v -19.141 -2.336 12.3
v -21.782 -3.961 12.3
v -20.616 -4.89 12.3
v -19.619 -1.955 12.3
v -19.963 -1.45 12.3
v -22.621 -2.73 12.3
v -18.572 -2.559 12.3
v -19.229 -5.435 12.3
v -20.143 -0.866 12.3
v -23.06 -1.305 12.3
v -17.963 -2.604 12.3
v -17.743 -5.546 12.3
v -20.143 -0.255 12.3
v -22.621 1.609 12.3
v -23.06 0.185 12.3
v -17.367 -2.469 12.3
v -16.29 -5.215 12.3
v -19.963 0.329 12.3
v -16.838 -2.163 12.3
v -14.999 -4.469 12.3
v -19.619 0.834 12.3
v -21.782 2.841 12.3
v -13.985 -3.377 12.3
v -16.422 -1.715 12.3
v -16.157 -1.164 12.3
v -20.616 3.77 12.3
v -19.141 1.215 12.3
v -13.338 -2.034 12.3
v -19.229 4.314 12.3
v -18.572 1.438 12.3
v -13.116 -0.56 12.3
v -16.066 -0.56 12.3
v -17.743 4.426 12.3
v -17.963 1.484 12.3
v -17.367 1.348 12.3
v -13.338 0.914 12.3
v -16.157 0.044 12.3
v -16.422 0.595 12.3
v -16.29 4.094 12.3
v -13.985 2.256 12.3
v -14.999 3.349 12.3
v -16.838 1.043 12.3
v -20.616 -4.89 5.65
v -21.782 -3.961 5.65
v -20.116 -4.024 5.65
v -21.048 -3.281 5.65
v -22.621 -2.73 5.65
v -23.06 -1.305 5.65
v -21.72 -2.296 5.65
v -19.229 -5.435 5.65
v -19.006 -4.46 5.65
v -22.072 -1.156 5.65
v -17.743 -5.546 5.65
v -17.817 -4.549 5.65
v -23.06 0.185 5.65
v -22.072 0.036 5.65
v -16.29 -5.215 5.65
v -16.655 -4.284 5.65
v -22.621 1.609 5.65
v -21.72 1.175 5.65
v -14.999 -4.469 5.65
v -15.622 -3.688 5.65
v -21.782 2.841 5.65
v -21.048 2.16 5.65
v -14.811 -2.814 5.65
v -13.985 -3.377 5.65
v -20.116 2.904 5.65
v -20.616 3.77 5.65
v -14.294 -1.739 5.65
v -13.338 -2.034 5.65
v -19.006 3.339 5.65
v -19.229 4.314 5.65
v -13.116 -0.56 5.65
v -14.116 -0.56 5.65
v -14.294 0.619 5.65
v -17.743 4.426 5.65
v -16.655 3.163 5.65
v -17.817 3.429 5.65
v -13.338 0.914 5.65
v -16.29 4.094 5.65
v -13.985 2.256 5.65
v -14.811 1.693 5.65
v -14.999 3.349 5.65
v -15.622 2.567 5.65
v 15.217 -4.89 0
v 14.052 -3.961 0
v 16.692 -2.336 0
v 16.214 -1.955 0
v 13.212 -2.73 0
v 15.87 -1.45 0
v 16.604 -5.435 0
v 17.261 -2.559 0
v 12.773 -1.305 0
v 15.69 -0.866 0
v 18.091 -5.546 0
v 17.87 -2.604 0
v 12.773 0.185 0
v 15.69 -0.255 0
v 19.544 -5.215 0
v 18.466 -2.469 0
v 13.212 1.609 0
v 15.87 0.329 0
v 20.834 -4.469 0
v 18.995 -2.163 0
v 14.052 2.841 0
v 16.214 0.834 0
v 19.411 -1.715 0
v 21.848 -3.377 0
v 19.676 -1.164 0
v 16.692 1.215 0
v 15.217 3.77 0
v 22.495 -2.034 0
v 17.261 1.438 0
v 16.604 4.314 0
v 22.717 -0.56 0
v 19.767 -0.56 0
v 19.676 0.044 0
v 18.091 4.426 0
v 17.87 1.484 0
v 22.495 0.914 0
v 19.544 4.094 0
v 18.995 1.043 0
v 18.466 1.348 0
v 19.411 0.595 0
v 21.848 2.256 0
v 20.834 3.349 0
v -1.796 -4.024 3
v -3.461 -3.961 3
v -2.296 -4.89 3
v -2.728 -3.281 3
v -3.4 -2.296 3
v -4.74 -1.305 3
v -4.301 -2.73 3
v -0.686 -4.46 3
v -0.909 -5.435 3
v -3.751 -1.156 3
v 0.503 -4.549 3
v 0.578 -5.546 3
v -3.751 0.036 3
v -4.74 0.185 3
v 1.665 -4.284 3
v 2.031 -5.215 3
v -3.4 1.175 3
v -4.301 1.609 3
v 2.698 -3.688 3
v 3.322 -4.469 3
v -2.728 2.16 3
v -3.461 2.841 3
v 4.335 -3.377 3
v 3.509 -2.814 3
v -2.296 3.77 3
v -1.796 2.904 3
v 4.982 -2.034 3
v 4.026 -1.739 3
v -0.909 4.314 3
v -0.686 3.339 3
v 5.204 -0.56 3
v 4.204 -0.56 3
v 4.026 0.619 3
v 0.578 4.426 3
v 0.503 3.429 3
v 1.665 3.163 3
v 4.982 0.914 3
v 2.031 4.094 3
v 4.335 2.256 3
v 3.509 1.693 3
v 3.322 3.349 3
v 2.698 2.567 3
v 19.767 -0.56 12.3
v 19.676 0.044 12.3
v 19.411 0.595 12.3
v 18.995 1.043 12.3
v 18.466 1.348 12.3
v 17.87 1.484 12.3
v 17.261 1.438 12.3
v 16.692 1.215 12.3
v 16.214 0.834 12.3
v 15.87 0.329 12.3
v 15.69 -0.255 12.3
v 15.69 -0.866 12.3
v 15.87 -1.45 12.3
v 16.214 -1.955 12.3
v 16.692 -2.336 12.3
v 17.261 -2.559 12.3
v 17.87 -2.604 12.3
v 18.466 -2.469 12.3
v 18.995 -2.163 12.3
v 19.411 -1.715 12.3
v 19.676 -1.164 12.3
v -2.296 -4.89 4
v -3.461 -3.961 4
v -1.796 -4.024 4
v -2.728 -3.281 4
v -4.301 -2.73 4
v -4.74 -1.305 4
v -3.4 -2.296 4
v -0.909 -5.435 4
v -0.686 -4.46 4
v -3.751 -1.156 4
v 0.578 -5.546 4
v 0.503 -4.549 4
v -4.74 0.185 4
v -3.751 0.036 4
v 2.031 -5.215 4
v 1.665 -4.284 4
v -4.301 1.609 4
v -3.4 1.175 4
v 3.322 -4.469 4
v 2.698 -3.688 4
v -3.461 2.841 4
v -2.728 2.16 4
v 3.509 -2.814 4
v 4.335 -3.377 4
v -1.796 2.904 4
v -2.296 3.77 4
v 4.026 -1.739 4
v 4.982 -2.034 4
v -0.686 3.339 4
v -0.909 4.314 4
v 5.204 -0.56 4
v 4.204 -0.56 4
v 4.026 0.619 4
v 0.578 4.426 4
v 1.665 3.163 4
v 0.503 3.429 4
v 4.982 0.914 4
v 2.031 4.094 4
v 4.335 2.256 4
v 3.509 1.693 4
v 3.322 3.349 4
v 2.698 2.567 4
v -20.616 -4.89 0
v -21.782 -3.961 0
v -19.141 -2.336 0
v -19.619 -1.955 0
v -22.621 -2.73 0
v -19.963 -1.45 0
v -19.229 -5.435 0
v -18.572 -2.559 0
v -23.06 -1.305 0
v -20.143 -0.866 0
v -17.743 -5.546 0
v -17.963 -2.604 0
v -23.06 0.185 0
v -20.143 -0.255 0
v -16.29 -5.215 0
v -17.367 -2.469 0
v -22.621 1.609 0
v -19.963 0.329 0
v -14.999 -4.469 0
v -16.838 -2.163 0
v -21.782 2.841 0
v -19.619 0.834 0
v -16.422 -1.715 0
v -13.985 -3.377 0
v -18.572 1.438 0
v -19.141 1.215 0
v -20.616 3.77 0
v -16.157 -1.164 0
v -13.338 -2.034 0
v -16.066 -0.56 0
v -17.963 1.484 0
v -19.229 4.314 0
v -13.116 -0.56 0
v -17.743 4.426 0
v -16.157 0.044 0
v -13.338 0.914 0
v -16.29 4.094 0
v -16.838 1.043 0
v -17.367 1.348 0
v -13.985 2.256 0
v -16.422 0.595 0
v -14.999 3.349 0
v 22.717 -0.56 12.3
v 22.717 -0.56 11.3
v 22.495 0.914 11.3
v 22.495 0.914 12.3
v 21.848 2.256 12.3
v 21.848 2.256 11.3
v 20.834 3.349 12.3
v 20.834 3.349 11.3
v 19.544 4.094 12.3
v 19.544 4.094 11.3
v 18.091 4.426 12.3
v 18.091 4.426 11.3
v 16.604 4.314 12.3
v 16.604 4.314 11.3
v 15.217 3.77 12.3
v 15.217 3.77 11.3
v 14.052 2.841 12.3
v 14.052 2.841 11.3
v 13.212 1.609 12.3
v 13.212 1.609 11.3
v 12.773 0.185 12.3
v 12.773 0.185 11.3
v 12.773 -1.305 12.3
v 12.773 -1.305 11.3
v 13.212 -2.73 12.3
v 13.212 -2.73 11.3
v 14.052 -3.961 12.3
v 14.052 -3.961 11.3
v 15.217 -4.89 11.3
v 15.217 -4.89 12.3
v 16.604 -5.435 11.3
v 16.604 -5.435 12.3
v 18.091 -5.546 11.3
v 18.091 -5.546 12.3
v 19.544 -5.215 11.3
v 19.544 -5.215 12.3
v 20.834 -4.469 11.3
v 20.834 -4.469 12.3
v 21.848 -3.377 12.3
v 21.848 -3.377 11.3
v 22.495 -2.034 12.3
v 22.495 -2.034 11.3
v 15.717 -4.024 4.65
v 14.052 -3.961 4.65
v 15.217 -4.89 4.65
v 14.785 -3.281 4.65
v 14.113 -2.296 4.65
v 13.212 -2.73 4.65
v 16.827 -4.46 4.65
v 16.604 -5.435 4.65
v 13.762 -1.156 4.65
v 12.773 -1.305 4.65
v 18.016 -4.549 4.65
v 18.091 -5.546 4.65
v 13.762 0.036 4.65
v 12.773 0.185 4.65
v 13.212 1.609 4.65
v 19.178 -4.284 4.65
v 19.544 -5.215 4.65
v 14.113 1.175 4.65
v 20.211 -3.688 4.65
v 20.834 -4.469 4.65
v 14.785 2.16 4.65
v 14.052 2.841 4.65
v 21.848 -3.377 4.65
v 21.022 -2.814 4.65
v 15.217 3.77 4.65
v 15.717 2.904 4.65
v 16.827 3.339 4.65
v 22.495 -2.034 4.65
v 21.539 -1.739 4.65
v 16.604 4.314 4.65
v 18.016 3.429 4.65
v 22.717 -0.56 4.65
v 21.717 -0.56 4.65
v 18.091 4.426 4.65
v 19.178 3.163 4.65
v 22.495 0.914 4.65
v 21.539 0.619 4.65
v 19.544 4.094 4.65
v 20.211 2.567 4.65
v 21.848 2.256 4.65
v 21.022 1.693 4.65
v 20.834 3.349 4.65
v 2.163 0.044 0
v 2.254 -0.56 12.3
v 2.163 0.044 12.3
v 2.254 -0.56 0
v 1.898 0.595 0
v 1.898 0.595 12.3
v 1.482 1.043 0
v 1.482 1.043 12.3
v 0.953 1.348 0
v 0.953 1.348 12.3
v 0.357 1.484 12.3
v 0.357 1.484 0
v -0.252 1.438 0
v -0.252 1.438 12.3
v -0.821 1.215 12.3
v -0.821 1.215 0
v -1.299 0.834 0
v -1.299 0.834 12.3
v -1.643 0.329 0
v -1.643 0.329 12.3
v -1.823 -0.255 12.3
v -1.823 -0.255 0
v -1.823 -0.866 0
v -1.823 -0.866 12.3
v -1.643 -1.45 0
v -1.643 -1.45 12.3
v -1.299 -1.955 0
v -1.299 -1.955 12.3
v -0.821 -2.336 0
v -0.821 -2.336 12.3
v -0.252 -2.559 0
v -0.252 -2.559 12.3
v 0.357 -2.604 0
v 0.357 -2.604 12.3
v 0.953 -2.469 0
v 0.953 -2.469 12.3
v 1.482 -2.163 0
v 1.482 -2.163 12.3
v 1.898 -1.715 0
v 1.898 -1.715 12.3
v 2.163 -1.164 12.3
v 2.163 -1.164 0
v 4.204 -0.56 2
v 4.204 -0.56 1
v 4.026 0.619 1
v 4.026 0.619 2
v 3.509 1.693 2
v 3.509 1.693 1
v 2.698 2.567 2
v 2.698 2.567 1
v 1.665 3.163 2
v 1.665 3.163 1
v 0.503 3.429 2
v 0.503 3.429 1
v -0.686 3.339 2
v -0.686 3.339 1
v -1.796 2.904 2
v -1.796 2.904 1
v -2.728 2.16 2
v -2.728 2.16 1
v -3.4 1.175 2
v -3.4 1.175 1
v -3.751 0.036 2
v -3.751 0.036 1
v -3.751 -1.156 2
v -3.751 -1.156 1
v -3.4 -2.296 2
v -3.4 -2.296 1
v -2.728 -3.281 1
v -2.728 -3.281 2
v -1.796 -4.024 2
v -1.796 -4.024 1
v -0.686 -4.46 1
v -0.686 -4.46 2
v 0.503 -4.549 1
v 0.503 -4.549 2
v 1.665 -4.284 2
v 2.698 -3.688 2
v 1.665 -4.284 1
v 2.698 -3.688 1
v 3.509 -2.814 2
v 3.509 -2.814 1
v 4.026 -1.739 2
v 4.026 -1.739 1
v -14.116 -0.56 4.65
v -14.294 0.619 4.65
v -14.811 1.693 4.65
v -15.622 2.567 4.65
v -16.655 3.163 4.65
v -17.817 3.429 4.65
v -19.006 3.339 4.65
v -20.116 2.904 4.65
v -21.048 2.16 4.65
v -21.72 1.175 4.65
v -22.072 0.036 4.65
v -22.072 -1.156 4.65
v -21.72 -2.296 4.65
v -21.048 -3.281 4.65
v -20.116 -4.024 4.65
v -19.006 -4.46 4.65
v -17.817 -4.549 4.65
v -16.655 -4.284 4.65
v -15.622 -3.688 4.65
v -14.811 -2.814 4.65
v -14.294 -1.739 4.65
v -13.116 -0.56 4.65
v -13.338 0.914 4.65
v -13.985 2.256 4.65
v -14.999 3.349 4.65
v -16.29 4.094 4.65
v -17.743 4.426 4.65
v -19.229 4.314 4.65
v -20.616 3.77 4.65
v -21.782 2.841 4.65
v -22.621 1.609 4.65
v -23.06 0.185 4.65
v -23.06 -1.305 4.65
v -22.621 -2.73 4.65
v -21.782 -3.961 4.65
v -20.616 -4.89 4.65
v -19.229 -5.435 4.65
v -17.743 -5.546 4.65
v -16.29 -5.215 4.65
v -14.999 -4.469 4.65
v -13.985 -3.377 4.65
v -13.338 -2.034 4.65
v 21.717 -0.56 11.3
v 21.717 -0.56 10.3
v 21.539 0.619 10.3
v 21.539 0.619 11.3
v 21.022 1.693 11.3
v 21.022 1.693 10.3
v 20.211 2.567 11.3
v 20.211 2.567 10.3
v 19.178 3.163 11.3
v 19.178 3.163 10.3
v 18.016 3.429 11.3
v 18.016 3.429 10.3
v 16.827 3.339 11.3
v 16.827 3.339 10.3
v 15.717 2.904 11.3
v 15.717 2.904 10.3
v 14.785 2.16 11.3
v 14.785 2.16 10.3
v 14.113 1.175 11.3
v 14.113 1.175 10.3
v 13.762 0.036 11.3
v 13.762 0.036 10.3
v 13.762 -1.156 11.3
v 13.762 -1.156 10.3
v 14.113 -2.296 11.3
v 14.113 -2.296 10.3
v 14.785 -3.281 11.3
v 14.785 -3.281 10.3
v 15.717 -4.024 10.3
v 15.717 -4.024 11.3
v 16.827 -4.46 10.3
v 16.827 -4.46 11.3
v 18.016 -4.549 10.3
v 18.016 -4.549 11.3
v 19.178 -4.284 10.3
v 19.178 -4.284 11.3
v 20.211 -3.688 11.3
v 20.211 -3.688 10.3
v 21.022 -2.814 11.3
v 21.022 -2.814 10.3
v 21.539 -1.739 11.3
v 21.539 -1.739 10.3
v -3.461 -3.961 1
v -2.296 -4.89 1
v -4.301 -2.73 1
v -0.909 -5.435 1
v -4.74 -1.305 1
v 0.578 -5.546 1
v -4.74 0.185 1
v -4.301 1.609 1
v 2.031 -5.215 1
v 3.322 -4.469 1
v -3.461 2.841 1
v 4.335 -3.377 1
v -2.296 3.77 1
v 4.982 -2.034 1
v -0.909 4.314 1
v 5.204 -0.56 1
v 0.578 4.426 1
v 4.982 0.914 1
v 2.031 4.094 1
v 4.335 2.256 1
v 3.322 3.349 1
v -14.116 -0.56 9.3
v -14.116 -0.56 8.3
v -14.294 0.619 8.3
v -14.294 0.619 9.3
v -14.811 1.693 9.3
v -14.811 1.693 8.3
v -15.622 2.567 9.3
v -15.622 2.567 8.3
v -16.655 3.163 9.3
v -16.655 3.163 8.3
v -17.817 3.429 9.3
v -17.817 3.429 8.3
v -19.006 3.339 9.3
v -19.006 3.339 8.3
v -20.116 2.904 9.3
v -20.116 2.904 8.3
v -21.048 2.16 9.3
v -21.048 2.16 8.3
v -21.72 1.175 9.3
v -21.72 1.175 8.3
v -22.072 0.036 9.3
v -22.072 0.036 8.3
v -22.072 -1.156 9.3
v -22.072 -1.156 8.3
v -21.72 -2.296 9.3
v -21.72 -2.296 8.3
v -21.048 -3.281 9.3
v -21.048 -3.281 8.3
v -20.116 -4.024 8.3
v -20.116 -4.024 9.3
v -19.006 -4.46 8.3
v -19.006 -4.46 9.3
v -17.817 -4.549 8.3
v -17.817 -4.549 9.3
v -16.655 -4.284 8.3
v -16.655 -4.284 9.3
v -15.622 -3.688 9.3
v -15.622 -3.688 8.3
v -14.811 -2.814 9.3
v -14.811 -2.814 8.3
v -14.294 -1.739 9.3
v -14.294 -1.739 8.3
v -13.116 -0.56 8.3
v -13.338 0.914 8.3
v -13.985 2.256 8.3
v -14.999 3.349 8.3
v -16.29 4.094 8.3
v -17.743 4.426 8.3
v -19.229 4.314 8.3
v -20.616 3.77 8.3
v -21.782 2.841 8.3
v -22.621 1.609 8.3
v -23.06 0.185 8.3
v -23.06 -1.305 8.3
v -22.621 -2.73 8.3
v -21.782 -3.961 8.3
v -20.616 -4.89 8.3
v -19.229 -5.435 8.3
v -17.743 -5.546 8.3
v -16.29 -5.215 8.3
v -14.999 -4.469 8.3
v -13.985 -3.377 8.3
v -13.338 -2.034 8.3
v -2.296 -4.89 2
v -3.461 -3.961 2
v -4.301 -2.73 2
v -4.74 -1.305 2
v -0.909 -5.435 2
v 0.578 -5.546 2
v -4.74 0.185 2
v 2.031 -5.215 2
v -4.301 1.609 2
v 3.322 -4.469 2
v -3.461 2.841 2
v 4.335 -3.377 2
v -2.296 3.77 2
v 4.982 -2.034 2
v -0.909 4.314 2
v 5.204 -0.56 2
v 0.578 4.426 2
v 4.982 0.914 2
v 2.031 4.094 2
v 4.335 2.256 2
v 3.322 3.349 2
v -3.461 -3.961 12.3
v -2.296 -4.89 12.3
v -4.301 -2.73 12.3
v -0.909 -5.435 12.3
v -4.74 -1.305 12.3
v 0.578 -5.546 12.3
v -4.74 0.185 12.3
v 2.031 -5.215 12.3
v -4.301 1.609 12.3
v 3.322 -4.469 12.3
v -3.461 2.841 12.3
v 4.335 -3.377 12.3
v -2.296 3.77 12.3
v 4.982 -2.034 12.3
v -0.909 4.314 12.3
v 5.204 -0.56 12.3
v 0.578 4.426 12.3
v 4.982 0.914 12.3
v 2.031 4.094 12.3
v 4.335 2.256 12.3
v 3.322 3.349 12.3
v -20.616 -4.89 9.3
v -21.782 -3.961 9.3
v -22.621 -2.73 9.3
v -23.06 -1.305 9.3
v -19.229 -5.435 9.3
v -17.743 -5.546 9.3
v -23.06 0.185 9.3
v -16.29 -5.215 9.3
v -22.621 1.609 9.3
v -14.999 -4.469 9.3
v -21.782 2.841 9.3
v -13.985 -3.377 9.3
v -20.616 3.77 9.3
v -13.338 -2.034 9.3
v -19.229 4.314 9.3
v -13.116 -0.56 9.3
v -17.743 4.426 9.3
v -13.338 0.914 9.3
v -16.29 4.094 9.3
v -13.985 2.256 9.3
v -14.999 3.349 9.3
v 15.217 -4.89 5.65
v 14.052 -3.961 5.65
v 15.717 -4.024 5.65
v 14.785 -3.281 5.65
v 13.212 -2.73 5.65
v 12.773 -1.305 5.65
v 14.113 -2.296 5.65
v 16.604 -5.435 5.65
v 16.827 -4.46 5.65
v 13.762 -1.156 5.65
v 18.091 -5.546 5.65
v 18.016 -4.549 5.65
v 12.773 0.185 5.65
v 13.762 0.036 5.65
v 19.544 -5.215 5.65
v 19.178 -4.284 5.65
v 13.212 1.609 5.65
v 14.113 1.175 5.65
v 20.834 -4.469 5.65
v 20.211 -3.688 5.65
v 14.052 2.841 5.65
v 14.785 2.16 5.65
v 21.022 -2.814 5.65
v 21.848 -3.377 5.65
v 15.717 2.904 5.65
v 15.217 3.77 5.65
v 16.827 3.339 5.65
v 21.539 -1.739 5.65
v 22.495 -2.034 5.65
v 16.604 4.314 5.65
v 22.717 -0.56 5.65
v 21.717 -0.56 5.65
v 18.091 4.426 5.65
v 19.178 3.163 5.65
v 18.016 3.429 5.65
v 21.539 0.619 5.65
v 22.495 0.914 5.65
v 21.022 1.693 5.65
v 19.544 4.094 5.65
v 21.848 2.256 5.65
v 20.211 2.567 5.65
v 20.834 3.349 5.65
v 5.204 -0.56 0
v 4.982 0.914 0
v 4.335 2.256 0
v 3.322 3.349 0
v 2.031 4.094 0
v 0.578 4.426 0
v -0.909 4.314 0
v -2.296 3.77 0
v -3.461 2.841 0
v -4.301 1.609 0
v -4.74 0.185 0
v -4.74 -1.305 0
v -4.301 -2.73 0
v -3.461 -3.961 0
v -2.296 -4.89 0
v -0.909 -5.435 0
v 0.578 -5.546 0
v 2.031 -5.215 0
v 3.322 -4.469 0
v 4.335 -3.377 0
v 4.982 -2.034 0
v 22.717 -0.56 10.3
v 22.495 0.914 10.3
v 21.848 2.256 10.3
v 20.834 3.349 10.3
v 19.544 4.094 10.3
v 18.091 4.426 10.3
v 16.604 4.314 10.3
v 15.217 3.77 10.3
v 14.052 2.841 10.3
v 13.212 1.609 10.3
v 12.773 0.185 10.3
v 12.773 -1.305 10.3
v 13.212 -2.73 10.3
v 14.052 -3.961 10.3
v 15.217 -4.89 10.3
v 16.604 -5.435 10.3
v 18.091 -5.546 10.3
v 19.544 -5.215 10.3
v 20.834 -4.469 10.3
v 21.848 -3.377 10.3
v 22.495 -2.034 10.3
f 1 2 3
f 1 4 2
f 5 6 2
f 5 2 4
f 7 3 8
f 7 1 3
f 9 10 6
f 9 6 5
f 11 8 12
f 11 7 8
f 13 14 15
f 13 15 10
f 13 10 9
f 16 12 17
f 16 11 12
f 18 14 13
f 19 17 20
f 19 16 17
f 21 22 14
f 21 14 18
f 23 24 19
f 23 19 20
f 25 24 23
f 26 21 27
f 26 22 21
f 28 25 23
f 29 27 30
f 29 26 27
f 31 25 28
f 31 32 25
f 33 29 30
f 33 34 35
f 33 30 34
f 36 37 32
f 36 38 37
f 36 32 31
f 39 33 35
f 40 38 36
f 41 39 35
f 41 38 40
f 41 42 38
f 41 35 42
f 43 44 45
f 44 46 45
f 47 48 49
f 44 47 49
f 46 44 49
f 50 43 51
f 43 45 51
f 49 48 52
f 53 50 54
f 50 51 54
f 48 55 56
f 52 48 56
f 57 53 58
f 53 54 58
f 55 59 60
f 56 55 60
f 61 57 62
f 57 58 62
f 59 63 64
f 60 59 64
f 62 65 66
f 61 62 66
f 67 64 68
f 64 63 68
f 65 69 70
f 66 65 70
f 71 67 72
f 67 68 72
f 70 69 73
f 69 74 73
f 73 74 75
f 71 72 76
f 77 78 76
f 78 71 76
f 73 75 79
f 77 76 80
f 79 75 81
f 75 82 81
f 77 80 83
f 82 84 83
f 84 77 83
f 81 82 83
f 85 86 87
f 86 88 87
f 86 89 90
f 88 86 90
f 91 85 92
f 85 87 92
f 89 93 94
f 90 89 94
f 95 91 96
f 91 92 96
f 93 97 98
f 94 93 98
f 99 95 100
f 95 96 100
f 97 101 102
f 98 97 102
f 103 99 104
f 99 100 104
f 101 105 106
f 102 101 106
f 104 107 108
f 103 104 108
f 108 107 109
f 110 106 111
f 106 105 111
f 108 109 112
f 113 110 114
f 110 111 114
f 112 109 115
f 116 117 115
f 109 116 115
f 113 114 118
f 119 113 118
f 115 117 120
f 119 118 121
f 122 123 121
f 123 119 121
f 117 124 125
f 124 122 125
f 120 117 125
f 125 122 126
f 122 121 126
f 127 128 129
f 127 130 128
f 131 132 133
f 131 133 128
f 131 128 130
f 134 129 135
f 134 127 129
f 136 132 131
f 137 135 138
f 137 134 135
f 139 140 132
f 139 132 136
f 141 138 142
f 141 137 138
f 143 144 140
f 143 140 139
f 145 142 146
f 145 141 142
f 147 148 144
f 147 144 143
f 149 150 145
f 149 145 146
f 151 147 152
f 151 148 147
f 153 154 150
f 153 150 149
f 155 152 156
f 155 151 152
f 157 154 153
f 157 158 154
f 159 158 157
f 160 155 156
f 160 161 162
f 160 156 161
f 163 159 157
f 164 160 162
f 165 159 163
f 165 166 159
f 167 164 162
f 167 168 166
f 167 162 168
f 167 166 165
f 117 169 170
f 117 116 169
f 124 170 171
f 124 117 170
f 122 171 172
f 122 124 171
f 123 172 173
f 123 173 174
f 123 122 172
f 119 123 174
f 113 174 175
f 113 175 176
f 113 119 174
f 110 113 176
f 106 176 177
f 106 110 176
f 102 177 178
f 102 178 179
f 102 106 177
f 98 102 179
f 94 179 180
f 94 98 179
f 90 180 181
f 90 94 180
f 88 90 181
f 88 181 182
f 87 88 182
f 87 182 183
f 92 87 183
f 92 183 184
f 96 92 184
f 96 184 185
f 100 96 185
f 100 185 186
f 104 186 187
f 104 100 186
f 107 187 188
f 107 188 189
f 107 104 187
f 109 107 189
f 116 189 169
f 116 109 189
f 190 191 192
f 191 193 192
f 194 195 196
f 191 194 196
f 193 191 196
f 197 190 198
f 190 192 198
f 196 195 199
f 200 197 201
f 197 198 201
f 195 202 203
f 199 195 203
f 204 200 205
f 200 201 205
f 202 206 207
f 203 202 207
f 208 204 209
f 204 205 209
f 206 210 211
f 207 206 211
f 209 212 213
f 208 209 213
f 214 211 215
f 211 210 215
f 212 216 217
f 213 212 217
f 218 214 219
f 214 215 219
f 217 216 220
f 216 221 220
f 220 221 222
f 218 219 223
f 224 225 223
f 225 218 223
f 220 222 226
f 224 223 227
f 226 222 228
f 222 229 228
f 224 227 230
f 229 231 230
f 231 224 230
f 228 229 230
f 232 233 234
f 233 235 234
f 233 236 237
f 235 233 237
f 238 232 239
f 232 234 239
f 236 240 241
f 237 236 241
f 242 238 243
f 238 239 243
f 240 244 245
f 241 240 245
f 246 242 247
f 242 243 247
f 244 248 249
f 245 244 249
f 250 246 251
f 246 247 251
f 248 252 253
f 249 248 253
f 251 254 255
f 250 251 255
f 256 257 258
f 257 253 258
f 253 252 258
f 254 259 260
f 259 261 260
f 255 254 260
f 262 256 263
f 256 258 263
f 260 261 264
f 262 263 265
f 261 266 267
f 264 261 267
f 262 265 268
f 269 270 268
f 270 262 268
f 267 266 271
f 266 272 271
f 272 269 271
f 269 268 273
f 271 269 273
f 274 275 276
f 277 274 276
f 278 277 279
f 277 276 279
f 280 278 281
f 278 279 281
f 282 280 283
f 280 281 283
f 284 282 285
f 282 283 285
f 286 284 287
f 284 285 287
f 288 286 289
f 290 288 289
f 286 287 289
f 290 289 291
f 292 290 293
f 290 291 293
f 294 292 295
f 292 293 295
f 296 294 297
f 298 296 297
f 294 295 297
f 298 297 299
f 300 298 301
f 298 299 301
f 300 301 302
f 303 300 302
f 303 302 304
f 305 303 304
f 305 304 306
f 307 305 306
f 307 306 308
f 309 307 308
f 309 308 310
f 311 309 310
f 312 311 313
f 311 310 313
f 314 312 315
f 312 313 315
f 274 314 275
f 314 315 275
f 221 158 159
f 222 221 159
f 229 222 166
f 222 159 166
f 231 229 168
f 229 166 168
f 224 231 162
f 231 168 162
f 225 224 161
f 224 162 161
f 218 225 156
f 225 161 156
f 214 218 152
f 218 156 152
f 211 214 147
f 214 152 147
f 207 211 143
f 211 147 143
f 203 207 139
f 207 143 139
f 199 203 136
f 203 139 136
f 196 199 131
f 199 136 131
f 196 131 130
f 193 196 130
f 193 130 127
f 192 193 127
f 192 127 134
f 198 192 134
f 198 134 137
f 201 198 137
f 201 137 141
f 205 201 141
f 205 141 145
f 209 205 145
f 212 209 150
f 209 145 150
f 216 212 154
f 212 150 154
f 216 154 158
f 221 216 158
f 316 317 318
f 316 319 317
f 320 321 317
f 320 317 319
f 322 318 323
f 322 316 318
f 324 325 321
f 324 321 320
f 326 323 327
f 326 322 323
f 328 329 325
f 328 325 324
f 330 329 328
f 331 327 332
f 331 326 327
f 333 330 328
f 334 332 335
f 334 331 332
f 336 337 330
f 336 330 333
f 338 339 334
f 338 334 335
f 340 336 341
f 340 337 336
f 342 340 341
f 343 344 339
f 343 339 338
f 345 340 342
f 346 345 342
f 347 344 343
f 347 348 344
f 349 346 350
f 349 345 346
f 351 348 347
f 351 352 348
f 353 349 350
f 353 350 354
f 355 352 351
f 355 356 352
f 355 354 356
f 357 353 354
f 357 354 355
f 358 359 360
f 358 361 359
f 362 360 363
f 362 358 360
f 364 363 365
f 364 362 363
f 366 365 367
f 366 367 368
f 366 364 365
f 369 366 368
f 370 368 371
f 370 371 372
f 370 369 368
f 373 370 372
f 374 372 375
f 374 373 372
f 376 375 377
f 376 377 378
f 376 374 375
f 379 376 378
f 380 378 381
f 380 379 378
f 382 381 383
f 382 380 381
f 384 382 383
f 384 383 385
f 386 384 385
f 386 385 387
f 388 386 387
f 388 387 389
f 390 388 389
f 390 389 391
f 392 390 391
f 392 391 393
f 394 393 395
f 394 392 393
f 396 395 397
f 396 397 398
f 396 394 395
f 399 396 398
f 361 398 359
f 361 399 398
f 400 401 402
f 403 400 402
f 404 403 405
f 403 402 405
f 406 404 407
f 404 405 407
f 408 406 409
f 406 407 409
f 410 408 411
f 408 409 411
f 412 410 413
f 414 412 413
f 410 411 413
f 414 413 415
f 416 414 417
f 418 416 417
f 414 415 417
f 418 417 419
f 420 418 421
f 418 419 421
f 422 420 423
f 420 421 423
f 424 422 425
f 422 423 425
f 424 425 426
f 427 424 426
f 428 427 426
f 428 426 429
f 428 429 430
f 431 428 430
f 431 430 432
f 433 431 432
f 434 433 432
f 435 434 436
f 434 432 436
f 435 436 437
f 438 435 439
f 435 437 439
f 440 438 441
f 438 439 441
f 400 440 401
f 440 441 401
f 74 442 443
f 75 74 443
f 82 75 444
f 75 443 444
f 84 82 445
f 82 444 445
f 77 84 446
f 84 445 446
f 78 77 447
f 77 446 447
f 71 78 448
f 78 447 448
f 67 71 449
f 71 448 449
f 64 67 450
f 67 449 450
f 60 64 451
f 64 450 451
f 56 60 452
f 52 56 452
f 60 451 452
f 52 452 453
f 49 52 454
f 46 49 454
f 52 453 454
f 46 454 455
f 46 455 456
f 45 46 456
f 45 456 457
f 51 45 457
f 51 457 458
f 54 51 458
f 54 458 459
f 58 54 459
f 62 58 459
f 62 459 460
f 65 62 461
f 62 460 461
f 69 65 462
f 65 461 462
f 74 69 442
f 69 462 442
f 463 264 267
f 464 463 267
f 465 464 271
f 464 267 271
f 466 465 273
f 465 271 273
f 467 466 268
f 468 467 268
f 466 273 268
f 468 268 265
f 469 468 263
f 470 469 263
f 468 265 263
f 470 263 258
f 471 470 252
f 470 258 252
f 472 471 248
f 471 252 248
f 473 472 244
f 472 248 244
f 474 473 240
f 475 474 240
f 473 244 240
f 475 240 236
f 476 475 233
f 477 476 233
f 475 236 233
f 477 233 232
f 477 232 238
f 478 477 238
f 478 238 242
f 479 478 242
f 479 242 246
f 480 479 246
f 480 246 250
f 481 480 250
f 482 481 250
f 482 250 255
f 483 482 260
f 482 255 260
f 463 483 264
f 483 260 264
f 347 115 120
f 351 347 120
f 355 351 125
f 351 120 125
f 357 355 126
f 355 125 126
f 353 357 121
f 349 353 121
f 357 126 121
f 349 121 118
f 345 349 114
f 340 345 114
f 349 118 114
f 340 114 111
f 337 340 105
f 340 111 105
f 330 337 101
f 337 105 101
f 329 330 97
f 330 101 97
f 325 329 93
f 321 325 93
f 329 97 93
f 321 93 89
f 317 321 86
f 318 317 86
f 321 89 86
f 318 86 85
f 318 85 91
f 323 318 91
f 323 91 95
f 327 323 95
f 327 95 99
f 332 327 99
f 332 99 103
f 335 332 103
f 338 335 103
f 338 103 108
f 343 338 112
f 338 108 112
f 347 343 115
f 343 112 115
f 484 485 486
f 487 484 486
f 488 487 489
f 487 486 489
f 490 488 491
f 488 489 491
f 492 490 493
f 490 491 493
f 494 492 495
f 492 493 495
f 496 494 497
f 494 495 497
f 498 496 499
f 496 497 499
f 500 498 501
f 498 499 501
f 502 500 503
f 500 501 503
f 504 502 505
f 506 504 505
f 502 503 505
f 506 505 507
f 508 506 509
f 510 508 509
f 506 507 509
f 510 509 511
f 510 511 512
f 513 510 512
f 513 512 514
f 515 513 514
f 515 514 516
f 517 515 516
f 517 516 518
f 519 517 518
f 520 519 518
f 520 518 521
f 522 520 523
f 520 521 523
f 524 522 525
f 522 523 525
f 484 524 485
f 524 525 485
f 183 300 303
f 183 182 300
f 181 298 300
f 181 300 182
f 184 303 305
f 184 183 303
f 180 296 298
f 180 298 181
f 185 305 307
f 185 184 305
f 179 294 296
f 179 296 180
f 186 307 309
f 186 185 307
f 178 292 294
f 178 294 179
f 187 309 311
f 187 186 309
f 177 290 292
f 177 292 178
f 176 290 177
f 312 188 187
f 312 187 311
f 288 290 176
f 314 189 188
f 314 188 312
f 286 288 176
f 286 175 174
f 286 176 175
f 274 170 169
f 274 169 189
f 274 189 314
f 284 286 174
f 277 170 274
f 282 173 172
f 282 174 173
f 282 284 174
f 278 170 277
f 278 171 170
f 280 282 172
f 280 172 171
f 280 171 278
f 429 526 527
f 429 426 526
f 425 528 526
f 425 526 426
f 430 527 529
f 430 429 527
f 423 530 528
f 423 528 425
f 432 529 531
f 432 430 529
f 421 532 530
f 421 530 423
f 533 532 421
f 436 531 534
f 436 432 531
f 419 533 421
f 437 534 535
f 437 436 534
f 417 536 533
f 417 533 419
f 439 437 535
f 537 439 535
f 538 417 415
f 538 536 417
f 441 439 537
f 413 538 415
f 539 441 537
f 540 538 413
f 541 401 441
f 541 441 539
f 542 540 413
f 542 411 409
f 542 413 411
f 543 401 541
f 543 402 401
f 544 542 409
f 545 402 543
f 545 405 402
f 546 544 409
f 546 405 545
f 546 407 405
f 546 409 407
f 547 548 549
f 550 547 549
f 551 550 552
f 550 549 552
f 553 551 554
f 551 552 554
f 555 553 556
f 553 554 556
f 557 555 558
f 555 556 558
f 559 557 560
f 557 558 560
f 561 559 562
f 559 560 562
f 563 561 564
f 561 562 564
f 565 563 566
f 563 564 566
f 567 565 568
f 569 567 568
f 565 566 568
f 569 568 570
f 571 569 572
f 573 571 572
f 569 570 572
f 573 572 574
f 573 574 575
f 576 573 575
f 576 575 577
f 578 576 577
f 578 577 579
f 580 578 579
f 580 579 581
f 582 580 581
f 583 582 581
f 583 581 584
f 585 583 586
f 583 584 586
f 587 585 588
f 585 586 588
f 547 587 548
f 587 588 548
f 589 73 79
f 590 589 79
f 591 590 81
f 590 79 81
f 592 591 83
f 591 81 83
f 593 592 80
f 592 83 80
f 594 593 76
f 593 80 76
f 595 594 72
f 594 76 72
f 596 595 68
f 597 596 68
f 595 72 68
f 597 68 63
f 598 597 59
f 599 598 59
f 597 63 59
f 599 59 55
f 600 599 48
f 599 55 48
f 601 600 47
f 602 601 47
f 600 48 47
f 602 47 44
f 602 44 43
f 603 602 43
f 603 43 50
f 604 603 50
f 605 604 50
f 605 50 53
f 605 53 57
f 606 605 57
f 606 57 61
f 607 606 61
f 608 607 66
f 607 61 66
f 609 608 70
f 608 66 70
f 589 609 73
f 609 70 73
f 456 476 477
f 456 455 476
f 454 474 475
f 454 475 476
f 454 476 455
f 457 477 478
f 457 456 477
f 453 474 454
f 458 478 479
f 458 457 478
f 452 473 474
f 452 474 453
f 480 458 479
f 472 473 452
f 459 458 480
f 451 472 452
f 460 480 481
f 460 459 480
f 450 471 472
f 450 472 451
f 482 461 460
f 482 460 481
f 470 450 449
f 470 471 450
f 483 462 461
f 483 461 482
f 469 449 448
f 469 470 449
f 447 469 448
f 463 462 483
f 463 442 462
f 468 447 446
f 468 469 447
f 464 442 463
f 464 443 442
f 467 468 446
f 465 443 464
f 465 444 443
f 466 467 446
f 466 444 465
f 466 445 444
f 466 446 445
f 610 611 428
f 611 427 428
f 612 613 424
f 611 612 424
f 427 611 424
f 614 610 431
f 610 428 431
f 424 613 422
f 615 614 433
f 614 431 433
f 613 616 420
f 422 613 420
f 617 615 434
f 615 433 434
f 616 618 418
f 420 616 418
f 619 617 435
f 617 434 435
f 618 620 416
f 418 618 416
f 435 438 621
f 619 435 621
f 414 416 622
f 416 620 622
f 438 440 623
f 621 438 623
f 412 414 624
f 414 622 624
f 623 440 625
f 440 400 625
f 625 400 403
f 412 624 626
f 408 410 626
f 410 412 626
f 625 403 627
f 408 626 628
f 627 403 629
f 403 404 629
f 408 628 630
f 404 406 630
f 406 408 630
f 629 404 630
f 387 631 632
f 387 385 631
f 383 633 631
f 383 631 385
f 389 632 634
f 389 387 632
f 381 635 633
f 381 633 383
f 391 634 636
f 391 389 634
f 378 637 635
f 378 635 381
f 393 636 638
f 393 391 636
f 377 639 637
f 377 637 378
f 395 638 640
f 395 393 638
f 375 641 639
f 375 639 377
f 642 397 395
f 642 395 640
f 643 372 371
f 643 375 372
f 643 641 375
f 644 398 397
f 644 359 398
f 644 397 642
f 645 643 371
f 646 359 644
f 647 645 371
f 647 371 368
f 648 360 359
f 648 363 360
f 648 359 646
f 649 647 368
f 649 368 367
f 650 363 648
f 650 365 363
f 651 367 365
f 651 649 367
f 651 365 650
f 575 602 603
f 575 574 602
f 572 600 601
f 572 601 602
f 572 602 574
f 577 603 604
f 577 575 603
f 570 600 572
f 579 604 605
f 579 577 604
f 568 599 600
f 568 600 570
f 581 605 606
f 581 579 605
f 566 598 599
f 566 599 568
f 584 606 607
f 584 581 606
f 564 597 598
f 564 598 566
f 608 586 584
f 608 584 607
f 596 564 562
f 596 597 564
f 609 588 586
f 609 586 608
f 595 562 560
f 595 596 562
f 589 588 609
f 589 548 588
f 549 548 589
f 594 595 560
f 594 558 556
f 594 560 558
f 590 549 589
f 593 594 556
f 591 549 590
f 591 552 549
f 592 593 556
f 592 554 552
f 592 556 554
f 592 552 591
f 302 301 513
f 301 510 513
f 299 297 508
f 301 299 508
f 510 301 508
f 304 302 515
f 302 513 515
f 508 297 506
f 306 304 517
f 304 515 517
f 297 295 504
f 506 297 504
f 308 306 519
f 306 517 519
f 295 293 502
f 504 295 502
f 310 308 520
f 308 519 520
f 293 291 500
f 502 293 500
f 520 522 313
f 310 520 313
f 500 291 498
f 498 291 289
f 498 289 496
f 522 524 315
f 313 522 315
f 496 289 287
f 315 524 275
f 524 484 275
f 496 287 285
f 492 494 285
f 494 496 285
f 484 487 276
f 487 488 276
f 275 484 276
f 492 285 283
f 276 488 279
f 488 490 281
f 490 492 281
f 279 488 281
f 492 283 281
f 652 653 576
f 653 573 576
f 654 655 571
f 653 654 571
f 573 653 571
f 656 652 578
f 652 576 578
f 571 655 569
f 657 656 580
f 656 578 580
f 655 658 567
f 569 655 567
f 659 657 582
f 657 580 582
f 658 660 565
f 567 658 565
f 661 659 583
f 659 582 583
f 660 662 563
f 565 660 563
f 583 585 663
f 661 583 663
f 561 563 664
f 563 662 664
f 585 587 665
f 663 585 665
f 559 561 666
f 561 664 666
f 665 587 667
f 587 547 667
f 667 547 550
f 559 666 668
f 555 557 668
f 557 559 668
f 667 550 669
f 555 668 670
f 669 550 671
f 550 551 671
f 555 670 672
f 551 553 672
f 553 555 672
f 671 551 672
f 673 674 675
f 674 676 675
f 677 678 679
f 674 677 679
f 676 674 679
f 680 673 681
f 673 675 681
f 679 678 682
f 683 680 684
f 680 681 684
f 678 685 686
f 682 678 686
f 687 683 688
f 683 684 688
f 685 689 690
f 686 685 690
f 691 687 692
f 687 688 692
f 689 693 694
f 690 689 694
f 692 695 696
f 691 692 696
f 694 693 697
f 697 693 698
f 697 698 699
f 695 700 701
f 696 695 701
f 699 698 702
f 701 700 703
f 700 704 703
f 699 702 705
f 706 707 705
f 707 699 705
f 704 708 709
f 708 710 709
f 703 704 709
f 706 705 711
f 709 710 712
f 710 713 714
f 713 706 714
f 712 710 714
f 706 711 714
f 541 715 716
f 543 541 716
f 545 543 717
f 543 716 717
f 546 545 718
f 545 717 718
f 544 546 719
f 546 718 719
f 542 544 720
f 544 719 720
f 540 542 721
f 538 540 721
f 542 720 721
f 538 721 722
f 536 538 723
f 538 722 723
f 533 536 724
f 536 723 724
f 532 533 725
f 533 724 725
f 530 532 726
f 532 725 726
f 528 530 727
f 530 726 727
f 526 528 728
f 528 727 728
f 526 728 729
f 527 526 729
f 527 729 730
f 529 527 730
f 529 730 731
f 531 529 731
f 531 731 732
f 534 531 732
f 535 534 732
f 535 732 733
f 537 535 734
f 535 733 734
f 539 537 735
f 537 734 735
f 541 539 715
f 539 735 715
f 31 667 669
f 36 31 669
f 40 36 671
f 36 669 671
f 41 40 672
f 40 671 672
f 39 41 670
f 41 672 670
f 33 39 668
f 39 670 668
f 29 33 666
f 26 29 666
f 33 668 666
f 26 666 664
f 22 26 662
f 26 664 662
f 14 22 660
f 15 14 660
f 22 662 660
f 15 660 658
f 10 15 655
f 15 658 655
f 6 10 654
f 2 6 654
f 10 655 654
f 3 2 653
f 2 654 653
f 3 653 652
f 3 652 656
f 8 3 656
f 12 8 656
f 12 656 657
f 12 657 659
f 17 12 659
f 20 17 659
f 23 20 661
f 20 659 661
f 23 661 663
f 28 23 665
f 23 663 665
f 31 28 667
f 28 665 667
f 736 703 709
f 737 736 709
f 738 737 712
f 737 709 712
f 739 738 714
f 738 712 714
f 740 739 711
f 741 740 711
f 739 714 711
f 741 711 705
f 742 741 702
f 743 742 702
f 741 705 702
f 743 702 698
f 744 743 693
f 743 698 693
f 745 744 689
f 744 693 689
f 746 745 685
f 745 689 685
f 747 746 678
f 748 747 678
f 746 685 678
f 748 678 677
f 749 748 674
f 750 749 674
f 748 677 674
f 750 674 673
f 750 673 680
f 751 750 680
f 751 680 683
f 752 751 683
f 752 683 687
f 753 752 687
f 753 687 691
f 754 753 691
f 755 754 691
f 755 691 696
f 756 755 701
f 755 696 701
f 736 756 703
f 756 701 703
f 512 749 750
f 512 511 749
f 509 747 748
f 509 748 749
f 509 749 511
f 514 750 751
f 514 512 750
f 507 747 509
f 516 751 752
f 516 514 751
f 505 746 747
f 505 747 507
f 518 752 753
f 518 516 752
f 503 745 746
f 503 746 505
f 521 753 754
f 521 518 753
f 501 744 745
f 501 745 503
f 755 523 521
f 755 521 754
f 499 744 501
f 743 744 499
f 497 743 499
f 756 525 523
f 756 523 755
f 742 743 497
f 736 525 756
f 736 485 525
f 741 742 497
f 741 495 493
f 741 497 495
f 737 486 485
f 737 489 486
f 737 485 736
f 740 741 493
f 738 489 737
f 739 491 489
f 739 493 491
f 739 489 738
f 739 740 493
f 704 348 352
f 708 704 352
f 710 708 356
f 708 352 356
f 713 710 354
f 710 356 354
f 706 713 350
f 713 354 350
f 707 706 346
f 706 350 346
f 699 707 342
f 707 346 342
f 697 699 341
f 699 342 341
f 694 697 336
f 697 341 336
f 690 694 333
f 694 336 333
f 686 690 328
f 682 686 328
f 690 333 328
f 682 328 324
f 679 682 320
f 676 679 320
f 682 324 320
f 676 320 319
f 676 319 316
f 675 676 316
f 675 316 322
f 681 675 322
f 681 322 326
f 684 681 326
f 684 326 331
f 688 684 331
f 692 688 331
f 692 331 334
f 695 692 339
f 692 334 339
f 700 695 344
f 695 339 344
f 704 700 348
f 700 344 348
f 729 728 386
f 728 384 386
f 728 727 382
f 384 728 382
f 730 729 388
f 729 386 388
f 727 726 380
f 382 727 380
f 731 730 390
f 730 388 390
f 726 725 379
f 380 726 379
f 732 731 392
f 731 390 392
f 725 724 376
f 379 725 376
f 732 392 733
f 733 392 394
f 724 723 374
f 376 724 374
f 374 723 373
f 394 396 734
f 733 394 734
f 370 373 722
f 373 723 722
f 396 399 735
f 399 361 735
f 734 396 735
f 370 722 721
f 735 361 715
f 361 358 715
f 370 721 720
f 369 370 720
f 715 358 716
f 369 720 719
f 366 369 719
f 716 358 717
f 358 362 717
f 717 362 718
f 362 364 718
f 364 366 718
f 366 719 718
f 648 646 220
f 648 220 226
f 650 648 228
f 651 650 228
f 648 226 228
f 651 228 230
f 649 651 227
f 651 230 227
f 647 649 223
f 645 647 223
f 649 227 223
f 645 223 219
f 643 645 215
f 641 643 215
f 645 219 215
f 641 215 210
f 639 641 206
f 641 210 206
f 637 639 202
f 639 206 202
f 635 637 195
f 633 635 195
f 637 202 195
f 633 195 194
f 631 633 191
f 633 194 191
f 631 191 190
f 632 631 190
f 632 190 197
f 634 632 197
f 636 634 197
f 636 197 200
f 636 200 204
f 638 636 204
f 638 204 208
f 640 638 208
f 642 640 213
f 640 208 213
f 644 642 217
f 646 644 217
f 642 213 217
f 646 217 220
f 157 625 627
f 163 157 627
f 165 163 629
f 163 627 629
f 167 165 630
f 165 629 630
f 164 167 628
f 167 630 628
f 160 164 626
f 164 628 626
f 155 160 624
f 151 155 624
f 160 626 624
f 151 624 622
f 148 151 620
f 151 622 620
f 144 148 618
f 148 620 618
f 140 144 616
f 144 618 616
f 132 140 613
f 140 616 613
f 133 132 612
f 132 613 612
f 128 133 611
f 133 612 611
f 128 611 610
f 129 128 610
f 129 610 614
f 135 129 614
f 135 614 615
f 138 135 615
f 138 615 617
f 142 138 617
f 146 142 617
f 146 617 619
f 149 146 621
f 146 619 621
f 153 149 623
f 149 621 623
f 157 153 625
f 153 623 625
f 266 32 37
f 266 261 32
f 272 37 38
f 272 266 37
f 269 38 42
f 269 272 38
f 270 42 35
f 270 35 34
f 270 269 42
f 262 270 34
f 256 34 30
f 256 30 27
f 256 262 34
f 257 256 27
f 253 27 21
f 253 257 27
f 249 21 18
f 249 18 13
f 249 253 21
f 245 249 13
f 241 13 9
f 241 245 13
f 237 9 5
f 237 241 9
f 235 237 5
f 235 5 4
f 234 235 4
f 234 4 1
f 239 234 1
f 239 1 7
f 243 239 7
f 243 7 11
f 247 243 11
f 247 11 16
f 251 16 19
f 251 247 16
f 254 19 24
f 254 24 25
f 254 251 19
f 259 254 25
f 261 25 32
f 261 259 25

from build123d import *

# Parameters (mm, degrees)
F0_R      = 5
F0_R_2    = 2.05
F1_DEPTH  = 1
F2_R      = 4
F2_R_2    = 2.05
F3_DEPTH  = 1
F4_R      = 5
F4_R_2    = 4
F4_R_3    = 2.05
F5_DEPTH  = 1
F6_R      = 4
F6_R_2    = 2.05
F7_DEPTH  = 1
F8_R      = 5
F8_R_2    = 4
F8_R_3    = 2.05
F9_DEPTH  = 8.3
F10_DEPTH = 4.65
F11_R     = 4
F11_R_2   = 2.05
F12_DEPTH = 1
F13_R     = 5
F13_R_2   = 4
F13_R_3   = 2.05
F14_DEPTH = 4.65
F15_DEPTH = 4.65
F16_R     = 4
F16_R_2   = 2.05
F17_DEPTH = 1
F18_R     = 5
F18_R_2   = 4
F18_R_3   = 2.05
F19_DEPTH = 2.65
F20_R     = 4
F20_R_2   = 2.05
F21_DEPTH = 1
F22_R     = 5
F22_R_2   = 4
F22_R_3   = 2.05
F23_DEPTH = 3
F24_R     = 4
F24_R_2   = 2.05
F25_DEPTH = 1
F26_R     = 5
F26_R_2   = 4
F26_R_3   = 2.05
F27_DEPTH = 1


with BuildPart() as f1:
    # F0 (on Top) → F1 (new body)
    with BuildSketch(Plane.XY):
        with Locations((0.204080643, -0.5602314472)):
            Circle(F0_R)
        with Locations((0.204080643, -0.5602314472)):
            Circle(F0_R_2, mode=Mode.SUBTRACT)
    extrude(amount=F1_DEPTH)

    # F2 (on face) → F3 (join)
    with BuildSketch(Plane.XY.offset(1)):
        with Locations((0.204080643, -0.5602314472)):
            Circle(F2_R)
        with Locations((0.204080643, -0.5602314472)):
            Circle(F2_R_2, mode=Mode.SUBTRACT)
    extrude(amount=F3_DEPTH)

    # F4 (on face) → F5 (join)
    with BuildSketch(Plane.XY.offset(2)):
        with Locations((0.204080643, -0.5602314472)):
            Circle(F4_R)
        with Locations((0.204080643, -0.5602314472)):
            Circle(F4_R_2, mode=Mode.SUBTRACT)
        with Locations((0.204080643, -0.5602314472)):
            Circle(F4_R_2)
        with Locations((0.204080643, -0.5602314472)):
            Circle(F4_R_3, mode=Mode.SUBTRACT)
    extrude(amount=F5_DEPTH)

    # F6 (on face) → F7 (join)
    with BuildSketch(Plane.XY.offset(3)):
        with Locations((0.204080643, -0.5602314472)):
            Circle(F6_R)
        with Locations((0.204080643, -0.5602314472)):
            Circle(F6_R_2, mode=Mode.SUBTRACT)
    extrude(amount=F7_DEPTH)

    # F8 (on face) → F9 (join)
    with BuildSketch(Plane.XY.offset(4)):
        with Locations((0.204080643, -0.5602314472)):
            Circle(F8_R)
        with Locations((0.204080643, -0.5602314472)):
            Circle(F8_R_2, mode=Mode.SUBTRACT)
        with Locations((0.204080643, -0.5602314472)):
            Circle(F8_R_2)
        with Locations((0.204080643, -0.5602314472)):
            Circle(F8_R_3, mode=Mode.SUBTRACT)
    extrude(amount=F9_DEPTH)


with BuildPart() as f10:
    # F0 (on Top) → F10 (new body)
    with BuildSketch(Plane.XY):
        with Locations((17.7169614471, -0.5602314472)):
            Circle(F0_R)
        with Locations((17.7169614471, -0.5602314472)):
            Circle(F0_R_2, mode=Mode.SUBTRACT)
    extrude(amount=F10_DEPTH)

    # F11 (on face) → F12 (join)
    with BuildSketch(Plane.XY.offset(4.65)):
        with Locations((17.7169614471, -0.5602314472)):
            Circle(F11_R)
        with Locations((17.7169614471, -0.5602314472)):
            Circle(F11_R_2, mode=Mode.SUBTRACT)
    extrude(amount=F12_DEPTH)

    # F13 (on face) → F14 (join)
    with BuildSketch(Plane.XY.offset(5.65)):
        with Locations((17.7169614471, -0.5602314472)):
            Circle(F13_R)
        with Locations((17.7169614471, -0.5602314472)):
            Circle(F13_R_2, mode=Mode.SUBTRACT)
        with Locations((17.7169614471, -0.5602314472)):
            Circle(F13_R_2)
        with Locations((17.7169614471, -0.5602314472)):
            Circle(F13_R_3, mode=Mode.SUBTRACT)
    extrude(amount=F14_DEPTH)

    # F24 (on face) → F25 (join)
    with BuildSketch(Plane.XY.offset(10.3)):
        with Locations((17.7169614471, -0.5602314472)):
            Circle(F24_R)
        with Locations((17.7169614471, -0.5602314472)):
            Circle(F24_R_2, mode=Mode.SUBTRACT)
    extrude(amount=F25_DEPTH)

    # F26 (on face) → F27 (join)
    with BuildSketch(Plane.XY.offset(11.3)):
        with Locations((17.7169614471, -0.5602314472)):
            Circle(F26_R)
        with Locations((17.7169614471, -0.5602314472)):
            Circle(F26_R_2, mode=Mode.SUBTRACT)
        with Locations((17.7169614471, -0.5602314472)):
            Circle(F26_R_2)
        with Locations((17.7169614471, -0.5602314472)):
            Circle(F26_R_3, mode=Mode.SUBTRACT)
    extrude(amount=F27_DEPTH)


with BuildPart() as f15:
    # F0 (on Top) → F15 (new body)
    with BuildSketch(Plane.XY):
        with Locations((-18.1162464432, -0.5602314472)):
            Circle(F0_R)
        with Locations((-18.1162464432, -0.5602314472)):
            Circle(F0_R_2, mode=Mode.SUBTRACT)
    extrude(amount=F15_DEPTH)

    # F16 (on face) → F17 (join)
    with BuildSketch(Plane.XY.offset(4.65)):
        with Locations((-18.1162464432, -0.5602314472)):
            Circle(F16_R)
        with Locations((-18.1162464432, -0.5602314472)):
            Circle(F16_R_2, mode=Mode.SUBTRACT)
    extrude(amount=F17_DEPTH)

    # F18 (on face) → F19 (join)
    with BuildSketch(Plane.XY.offset(5.65)):
        with Locations((-18.1162464432, -0.5602314472)):
            Circle(F18_R)
        with Locations((-18.1162464432, -0.5602314472)):
            Circle(F18_R_2, mode=Mode.SUBTRACT)
        with Locations((-18.1162464432, -0.5602314472)):
            Circle(F18_R_2)
        with Locations((-18.1162464432, -0.5602314472)):
            Circle(F18_R_3, mode=Mode.SUBTRACT)
    extrude(amount=F19_DEPTH)

    # F20 (on face) → F21 (join)
    with BuildSketch(Plane.XY.offset(8.3)):
        with Locations((-18.1162464432, -0.5602314472)):
            Circle(F20_R)
        with Locations((-18.1162464432, -0.5602314472)):
            Circle(F20_R_2, mode=Mode.SUBTRACT)
    extrude(amount=F21_DEPTH)

    # F22 (on face) → F23 (join)
    with BuildSketch(Plane.XY.offset(9.3)):
        with Locations((-18.1162464432, -0.5602314472)):
            Circle(F22_R)
        with Locations((-18.1162464432, -0.5602314472)):
            Circle(F22_R_2, mode=Mode.SUBTRACT)
        with Locations((-18.1162464432, -0.5602314472)):
            Circle(F22_R_2)
        with Locations((-18.1162464432, -0.5602314472)):
            Circle(F22_R_3, mode=Mode.SUBTRACT)
    extrude(amount=F23_DEPTH)


solid = Compound([f1.part, f10.part, f15.part])
